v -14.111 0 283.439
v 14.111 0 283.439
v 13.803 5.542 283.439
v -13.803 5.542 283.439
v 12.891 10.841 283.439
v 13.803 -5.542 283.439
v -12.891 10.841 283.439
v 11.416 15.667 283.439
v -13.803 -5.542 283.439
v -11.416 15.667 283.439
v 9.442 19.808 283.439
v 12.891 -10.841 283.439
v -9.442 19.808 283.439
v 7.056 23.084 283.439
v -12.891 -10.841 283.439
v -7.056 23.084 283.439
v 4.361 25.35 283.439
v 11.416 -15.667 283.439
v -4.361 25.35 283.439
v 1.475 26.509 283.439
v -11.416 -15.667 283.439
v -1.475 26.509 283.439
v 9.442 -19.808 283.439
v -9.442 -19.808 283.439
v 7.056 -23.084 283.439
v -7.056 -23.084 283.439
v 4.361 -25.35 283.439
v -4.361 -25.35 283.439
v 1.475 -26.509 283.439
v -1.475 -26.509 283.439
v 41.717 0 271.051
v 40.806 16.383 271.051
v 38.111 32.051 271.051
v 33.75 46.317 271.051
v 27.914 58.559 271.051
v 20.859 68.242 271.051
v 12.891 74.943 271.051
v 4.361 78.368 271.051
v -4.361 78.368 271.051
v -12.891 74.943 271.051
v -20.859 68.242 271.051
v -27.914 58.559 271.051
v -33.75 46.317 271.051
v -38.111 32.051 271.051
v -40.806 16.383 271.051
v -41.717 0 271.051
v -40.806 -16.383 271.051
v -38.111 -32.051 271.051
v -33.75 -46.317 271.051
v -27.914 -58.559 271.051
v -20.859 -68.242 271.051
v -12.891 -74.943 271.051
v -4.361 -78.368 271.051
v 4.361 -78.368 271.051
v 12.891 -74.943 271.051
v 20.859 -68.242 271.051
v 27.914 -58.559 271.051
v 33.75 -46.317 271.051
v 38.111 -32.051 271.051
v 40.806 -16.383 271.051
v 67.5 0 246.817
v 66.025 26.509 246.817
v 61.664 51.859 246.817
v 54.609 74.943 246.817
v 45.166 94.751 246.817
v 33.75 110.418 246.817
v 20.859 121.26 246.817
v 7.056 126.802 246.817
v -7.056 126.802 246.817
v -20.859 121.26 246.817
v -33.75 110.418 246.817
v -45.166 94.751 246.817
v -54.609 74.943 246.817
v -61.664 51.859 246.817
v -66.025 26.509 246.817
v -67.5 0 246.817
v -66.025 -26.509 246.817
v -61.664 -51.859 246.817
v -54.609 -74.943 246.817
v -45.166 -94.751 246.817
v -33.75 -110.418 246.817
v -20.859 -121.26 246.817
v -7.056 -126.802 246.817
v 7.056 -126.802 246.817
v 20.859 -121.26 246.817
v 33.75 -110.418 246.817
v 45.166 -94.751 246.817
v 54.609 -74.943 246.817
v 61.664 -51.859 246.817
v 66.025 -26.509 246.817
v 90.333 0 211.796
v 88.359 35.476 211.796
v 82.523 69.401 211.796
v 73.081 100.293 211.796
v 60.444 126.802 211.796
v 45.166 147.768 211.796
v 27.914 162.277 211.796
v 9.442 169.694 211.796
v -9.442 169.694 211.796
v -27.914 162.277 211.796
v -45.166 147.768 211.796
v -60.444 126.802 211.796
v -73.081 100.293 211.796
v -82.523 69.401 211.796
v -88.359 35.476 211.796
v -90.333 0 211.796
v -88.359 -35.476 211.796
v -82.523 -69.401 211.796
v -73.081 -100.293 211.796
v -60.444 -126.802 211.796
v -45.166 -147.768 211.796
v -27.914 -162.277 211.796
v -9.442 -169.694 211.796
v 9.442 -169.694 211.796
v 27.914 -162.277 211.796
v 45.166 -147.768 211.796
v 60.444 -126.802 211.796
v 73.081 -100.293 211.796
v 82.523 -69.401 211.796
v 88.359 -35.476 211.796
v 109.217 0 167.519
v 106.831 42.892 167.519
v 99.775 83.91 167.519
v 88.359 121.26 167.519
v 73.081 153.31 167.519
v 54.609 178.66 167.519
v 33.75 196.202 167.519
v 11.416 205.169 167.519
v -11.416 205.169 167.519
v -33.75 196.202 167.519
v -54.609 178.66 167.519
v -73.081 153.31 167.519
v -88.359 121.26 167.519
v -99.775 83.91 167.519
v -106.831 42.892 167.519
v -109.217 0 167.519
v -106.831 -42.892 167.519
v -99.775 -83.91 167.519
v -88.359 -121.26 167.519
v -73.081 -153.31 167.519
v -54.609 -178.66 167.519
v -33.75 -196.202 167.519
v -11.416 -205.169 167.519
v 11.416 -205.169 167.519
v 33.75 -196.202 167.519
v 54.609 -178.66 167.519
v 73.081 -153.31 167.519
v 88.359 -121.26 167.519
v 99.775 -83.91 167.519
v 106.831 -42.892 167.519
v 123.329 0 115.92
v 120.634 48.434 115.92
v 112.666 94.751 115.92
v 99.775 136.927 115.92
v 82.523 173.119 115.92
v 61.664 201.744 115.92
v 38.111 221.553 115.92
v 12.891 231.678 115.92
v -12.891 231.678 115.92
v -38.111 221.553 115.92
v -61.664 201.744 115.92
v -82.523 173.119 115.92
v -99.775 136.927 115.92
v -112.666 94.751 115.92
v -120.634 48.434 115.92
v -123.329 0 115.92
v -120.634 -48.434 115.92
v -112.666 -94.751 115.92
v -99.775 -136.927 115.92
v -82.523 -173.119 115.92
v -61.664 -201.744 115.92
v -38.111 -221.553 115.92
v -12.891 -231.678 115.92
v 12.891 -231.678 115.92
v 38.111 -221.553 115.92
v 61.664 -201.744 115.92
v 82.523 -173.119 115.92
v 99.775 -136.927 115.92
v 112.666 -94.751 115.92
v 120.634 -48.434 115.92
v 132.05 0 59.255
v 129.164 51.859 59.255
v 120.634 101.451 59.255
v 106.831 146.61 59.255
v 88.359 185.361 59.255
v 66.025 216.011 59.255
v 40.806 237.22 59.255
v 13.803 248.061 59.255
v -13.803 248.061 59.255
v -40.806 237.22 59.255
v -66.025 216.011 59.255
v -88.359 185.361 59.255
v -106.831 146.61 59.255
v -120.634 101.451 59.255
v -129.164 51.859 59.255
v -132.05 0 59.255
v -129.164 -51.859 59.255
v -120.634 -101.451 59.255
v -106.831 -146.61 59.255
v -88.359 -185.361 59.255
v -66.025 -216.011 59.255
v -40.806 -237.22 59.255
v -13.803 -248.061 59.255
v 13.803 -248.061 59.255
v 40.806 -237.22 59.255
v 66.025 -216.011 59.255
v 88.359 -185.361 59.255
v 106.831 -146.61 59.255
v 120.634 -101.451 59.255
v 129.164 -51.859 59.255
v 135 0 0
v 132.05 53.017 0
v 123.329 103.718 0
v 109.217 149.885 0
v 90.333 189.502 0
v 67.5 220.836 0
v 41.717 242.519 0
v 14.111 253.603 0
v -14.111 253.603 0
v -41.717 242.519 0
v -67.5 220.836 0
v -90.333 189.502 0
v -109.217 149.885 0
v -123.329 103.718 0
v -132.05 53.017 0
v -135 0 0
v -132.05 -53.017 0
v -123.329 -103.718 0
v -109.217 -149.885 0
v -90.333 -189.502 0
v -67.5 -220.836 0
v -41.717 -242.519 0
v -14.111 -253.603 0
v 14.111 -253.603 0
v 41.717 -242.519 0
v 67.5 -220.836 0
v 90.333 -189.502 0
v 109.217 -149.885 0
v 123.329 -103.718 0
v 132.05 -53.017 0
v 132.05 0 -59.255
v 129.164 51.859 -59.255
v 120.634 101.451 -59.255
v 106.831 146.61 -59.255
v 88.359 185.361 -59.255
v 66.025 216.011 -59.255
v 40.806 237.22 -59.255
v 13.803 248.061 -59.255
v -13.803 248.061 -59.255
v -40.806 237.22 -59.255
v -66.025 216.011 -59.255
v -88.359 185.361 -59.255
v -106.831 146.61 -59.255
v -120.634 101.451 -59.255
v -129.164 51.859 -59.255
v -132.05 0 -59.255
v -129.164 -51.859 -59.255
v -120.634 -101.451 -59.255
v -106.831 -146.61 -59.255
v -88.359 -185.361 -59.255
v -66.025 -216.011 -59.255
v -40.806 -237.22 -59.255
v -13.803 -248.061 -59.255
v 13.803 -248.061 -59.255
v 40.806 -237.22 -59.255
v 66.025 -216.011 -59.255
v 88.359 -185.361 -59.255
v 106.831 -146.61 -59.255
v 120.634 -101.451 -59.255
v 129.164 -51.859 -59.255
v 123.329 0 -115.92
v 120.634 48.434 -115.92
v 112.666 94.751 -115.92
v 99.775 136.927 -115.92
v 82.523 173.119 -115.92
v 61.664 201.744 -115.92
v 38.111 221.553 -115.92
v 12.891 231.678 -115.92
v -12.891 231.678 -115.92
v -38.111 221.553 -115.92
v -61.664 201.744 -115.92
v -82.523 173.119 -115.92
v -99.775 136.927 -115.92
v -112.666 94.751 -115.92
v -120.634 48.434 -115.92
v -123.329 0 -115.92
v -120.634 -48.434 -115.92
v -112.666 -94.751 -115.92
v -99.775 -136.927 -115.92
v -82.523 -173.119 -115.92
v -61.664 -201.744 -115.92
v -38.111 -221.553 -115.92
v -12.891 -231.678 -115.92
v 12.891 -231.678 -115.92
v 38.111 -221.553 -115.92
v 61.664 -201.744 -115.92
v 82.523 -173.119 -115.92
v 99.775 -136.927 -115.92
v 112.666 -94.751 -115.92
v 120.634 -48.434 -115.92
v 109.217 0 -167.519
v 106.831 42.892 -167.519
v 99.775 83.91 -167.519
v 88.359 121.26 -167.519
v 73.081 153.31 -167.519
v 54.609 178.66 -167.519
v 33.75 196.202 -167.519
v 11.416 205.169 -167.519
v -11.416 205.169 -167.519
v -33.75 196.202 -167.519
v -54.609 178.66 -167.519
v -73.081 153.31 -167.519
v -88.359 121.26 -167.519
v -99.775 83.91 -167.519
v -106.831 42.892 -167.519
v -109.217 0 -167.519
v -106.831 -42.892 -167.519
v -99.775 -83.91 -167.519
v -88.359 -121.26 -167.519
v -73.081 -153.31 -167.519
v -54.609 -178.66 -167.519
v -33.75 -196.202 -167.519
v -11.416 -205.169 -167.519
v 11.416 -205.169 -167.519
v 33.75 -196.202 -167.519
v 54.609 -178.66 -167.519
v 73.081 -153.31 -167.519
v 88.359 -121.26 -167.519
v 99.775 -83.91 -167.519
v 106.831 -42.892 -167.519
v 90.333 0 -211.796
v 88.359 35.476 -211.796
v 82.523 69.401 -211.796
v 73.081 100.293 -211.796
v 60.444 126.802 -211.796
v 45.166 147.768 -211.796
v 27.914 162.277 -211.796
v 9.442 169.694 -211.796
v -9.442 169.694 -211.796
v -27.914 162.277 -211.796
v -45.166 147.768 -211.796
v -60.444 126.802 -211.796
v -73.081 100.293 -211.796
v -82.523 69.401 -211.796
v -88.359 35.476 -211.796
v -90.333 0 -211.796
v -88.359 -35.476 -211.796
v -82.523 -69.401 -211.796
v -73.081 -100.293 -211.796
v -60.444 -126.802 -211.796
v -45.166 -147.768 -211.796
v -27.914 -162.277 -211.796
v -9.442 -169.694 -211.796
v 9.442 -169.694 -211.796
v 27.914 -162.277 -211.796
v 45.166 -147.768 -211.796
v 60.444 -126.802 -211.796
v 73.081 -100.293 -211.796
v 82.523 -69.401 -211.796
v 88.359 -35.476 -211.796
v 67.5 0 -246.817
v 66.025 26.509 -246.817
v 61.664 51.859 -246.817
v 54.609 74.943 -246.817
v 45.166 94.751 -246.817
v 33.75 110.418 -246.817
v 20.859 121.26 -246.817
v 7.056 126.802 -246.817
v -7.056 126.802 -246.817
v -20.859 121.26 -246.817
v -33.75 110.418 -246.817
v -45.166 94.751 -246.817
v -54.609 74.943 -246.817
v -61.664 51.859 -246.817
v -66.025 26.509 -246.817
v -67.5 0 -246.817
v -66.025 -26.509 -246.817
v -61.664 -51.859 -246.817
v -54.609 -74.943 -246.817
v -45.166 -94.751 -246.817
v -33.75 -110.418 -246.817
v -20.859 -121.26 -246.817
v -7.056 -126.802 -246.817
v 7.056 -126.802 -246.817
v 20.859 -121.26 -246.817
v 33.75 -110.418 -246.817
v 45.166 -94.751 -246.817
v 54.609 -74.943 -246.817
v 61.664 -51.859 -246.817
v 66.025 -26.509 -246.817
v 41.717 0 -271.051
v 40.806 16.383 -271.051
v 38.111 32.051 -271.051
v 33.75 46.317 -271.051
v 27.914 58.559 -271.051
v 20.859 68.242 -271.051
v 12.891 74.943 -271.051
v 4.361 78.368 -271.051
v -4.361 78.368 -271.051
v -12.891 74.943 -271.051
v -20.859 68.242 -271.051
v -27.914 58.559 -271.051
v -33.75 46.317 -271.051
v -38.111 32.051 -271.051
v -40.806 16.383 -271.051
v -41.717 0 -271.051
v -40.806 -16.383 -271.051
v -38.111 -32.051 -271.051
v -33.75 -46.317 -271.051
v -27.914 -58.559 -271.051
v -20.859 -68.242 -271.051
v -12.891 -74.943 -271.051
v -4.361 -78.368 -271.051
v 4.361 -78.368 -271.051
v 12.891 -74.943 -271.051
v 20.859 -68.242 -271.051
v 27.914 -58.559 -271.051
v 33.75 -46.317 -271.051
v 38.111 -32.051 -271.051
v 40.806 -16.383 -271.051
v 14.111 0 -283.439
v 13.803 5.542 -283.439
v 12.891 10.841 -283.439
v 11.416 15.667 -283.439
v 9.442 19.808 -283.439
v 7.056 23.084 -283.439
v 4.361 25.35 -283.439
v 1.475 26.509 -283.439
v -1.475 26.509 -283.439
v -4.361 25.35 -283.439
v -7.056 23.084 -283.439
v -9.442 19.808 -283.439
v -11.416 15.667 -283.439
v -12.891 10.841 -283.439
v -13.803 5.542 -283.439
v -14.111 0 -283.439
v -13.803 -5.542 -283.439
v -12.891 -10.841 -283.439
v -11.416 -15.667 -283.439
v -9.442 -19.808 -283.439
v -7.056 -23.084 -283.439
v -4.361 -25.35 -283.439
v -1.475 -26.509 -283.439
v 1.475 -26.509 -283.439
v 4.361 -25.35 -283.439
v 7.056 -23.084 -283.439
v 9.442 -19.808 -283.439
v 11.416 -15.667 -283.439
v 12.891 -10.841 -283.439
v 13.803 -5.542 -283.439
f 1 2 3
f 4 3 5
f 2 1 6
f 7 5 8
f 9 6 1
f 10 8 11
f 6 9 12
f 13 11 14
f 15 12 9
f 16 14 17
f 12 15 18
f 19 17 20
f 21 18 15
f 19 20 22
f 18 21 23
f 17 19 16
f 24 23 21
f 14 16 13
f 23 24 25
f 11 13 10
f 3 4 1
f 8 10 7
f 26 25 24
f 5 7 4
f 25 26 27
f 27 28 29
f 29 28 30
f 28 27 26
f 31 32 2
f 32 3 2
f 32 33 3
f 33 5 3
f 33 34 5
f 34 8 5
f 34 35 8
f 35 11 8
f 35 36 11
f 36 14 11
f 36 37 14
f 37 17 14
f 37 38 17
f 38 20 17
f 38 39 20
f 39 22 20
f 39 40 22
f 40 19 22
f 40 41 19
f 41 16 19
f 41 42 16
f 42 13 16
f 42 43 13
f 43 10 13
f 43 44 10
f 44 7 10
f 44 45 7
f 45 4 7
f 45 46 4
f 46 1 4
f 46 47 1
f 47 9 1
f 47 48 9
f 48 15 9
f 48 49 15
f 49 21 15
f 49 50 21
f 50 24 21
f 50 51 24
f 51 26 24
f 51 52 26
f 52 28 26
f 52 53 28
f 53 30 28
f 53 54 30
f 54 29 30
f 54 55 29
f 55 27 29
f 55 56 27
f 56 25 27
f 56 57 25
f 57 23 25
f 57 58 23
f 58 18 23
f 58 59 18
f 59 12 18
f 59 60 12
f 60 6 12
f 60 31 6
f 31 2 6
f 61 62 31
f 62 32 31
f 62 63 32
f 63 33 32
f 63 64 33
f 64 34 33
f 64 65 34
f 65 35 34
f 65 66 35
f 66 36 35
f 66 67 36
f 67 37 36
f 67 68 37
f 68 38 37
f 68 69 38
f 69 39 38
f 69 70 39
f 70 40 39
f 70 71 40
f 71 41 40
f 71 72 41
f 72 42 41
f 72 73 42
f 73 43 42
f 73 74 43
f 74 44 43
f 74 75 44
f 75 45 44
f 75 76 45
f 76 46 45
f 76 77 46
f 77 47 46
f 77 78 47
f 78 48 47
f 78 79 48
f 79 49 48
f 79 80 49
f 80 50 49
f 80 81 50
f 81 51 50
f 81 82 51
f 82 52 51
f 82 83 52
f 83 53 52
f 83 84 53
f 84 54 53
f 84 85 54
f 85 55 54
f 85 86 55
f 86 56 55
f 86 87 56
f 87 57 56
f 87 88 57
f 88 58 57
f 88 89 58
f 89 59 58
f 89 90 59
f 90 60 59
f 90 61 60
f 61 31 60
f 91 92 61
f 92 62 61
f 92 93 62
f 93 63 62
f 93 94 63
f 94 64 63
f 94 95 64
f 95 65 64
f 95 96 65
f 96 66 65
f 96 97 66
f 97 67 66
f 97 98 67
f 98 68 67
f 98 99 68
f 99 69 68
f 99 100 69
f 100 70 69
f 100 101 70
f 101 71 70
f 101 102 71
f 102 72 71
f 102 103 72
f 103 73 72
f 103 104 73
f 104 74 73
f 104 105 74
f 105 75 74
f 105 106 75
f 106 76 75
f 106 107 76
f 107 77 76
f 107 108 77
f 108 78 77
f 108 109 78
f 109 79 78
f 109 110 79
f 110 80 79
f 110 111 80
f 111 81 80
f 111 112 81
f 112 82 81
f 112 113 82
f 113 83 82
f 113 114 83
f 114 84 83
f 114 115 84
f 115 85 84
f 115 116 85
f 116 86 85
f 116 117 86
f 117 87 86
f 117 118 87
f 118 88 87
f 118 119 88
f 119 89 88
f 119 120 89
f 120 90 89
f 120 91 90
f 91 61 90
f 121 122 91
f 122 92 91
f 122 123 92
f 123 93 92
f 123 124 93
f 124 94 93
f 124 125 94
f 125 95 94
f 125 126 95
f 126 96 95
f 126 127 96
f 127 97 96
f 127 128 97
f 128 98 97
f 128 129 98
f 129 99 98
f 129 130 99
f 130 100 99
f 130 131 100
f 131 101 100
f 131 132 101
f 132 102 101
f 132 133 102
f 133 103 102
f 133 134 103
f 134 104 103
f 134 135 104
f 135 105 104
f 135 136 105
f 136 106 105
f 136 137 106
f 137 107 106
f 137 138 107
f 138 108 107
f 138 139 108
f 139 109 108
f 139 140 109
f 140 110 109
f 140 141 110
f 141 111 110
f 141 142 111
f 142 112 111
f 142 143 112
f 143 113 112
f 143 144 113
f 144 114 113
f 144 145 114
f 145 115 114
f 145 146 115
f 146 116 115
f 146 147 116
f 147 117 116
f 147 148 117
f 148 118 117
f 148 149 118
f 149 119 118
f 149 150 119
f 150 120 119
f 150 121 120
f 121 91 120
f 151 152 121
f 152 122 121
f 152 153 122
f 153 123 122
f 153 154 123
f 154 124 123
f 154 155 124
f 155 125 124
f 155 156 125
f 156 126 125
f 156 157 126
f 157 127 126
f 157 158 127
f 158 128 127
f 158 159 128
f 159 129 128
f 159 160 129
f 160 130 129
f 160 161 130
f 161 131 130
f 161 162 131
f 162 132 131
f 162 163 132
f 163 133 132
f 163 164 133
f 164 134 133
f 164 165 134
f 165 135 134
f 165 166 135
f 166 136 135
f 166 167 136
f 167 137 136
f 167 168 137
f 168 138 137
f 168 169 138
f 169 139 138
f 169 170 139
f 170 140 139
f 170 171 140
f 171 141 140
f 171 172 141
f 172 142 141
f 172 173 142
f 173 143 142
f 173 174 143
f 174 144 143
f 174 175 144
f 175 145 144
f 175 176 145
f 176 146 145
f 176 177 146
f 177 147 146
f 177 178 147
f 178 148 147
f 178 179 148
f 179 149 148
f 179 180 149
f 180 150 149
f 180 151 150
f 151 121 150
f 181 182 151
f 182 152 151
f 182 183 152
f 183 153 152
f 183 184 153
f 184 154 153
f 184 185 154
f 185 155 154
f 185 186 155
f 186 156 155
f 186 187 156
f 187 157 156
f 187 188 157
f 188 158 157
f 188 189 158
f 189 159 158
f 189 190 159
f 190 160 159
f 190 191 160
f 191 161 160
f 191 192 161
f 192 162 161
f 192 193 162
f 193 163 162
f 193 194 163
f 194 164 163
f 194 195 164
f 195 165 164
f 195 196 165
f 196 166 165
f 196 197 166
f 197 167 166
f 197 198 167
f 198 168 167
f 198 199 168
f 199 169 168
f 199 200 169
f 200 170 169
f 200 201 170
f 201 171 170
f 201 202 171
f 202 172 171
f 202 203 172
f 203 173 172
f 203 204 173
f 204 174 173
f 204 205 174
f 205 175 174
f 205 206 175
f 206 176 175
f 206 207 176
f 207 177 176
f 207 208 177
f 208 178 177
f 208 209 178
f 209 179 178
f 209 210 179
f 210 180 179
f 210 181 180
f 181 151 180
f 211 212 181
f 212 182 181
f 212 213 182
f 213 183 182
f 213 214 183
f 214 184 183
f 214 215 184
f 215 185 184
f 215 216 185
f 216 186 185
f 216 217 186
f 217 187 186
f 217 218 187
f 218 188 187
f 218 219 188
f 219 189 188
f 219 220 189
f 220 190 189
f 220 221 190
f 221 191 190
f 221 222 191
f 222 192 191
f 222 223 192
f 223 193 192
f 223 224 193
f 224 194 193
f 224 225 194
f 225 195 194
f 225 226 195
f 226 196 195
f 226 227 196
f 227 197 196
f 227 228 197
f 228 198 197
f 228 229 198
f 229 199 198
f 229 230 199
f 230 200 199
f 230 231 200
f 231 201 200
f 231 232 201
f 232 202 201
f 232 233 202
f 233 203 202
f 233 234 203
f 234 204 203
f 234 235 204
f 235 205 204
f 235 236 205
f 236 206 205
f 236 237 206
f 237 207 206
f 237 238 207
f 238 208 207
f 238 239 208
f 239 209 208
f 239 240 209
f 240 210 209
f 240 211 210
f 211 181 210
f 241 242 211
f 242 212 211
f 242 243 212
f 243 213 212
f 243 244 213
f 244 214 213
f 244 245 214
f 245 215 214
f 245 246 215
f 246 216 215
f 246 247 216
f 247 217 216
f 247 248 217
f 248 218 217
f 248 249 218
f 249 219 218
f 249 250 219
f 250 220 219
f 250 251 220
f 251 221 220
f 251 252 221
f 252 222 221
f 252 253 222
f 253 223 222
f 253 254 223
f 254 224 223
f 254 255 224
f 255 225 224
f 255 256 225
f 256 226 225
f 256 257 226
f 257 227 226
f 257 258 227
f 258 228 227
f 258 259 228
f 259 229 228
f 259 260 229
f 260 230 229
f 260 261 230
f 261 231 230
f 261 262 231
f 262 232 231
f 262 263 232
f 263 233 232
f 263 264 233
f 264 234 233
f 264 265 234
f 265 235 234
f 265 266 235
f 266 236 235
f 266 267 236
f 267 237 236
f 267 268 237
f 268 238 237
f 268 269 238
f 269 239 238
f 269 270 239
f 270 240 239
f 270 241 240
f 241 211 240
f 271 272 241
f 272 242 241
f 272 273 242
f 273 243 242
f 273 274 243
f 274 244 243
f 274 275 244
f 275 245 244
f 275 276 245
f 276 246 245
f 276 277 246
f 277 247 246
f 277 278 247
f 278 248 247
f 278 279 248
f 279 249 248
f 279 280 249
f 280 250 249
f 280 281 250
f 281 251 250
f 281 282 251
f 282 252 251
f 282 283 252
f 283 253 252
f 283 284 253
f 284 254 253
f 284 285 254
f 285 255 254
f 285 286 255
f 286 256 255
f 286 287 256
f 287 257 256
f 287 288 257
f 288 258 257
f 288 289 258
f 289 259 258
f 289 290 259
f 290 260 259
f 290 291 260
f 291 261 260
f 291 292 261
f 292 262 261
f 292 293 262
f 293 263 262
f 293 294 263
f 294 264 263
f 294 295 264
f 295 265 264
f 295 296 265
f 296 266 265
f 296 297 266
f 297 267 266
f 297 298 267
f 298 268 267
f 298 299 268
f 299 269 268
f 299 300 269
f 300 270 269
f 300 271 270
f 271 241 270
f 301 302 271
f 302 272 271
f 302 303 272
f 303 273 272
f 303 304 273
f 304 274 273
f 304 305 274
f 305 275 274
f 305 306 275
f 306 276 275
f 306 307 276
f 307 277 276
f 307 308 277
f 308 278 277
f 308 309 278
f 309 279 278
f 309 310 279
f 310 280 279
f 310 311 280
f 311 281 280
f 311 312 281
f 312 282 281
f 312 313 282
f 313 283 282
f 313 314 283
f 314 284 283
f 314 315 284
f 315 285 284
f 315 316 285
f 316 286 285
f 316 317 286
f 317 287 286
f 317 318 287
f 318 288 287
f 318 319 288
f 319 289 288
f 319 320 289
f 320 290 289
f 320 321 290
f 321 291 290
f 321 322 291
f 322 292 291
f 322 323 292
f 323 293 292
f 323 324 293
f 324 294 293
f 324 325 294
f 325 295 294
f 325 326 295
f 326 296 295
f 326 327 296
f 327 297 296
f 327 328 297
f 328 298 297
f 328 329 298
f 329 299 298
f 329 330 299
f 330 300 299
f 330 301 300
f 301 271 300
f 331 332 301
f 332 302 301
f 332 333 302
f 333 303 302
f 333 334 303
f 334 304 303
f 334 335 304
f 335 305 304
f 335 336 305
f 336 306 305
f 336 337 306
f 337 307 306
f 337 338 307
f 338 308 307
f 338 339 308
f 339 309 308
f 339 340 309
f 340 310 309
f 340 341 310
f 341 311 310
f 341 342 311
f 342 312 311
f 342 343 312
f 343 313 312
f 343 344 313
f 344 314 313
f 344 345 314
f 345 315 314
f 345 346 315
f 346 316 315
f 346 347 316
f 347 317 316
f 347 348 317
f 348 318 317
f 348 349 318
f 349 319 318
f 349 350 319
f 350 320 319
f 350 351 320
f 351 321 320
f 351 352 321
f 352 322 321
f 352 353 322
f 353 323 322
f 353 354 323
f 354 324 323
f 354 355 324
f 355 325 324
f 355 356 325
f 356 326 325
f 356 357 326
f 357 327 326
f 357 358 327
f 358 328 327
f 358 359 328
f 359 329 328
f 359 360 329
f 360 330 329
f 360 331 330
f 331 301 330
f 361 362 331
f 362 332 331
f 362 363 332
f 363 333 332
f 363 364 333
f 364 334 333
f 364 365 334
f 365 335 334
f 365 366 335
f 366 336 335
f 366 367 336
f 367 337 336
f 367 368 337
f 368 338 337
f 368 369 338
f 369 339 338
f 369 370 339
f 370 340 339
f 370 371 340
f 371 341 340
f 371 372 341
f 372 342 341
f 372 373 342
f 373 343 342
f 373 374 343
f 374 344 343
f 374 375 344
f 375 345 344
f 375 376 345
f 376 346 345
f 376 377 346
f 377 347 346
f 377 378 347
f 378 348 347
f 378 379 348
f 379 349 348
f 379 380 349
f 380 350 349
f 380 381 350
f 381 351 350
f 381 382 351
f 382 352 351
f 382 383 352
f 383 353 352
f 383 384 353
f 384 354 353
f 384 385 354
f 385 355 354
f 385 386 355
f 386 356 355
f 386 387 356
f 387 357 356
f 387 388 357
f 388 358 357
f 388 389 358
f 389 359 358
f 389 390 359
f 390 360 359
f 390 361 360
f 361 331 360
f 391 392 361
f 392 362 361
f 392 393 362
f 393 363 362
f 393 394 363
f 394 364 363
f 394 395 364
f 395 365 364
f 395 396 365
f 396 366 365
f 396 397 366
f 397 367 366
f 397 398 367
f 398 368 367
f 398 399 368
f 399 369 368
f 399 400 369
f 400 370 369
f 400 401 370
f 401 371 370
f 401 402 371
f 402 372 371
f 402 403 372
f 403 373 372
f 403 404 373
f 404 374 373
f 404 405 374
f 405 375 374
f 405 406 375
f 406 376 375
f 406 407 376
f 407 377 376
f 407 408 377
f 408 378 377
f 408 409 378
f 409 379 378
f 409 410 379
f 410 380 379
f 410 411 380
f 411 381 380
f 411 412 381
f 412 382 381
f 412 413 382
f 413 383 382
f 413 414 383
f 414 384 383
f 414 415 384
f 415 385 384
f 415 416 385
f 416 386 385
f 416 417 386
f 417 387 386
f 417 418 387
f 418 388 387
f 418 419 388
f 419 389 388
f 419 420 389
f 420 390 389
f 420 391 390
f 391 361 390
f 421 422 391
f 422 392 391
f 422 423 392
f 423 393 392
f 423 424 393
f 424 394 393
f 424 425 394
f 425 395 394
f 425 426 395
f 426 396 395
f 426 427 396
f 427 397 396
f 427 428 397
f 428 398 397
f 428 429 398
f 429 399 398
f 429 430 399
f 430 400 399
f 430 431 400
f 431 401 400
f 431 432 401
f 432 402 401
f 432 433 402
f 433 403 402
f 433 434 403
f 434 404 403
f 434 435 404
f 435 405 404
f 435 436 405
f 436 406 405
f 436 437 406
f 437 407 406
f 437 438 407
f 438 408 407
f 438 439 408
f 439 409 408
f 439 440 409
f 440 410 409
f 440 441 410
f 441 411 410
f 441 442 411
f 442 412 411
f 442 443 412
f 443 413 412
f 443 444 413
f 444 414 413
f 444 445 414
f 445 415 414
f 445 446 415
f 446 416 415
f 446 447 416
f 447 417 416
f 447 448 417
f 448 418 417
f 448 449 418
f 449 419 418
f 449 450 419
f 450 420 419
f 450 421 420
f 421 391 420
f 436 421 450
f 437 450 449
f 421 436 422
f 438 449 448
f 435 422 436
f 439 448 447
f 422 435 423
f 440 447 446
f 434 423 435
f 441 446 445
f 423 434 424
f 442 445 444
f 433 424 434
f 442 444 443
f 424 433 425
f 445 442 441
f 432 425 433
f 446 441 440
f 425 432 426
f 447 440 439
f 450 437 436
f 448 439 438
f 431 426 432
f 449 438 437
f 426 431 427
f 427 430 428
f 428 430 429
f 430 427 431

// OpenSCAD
// Generated by SolidPython 1.0.1 on 2020-07-29 00:46:49


scale(v = [9, 17, 19]) {
	sphere(r = 15);
}
/***********************************************
*********      SolidPython code:      **********
************************************************
 
# import packages: SolidPython
from solid import *
from solid.utils import *
from itertools import chain, combinations, permutations


class Resize:

    def __init__(self, scad_file):
        self.scad_file = scad_file
        #self.scad_file = import_scad(scad_file)
        # cone/cylinder param:
        self.r1 = 0
        self.r2 = 0
        self.h = 0
        # rectangular prism param:
        self.w = 0
        self.l = 0
        # ellipse param:
        self.r = 0

    # import OpenScad code (file name corresponds to shape)


    # classify shape + parameters
    def assign(self, param1, param2, param3):
        if self.scad_file == 'cone.scad':
            self.r1 = param1
            self.r2 = param2
            self.h = param3
        elif self.scad_file == 'cylinder.scad':
            self.r1 = param1
            self.r2 = param2
            self.h = param3
        elif self.scad_file == 'rectangularPrism.scad':
            self.h = param1
            self.l = param2
            self.w = param3
        else:
            self.r = param1
            self.h = param2

    # resize parameters
    def iterate(self):
        x = range(3, 20, 2)
        i = 1
        if self.scad_file == 'cone.scad':
            tempList = list(permutations(x, 2))
            for temp in tempList:
                param1 = temp[0]
                param2 = temp[1]
                filepath = 'produced_scad_files/' + 'cone' + str(param1) + '_' + str(param2) + '_' + '.scad'
                scad_render_to_file(cylinder(h=param1, r1=param2, r2=0), filepath)

        elif self.scad_file == 'cylinder.scad':
            tempList = list(permutations(x, 3))
            for temp in tempList:
                param1 = temp[0]
                param2 = temp[1]
                filepath = 'produced_scad_files/' + 'cylinder' + str(param1) + '_' + str(param2) + '_' + '.scad'
                scad_render_to_file(cylinder(h=param1, r1=param2, r2=param2), filepath)

        elif self.scad_file == 'rectangularPrism.scad':
            tempList = list(permutations(x, 3))
            for temp in tempList:
                param1 = temp[0]
                param2 = temp[1]
                param3 = temp[2]
                filepath = 'produced_scad_files/' + 'rectangularPrism' + str(param1) + '_' + str(param2) + '_' + str(
                    param3) + '.scad'
                scad_render_to_file(cube(size=(param1, param2, param3)), filepath)

        elif self.scad_file == 'ellipse.scad':
            tempList = list(permutations(x, 4))
            for temp in tempList:
                param1 = temp[0]
                param2 = temp[1]
                param3 = temp[2]
                param4 = temp[3]
                filepath = 'produced_scad_files/' + 'ellipse' + str(param1) + '_' + str(param2) + '_' + str(param3) + '_' + str(param4) + '.scad'
                scad_render_to_file(scale([param1, param2, param3])(sphere(r=param4)), filepath)

    def render_to_scadfile(self):
        scad_render_to_file(scad, 'example.scad') 
 
************************************************/
